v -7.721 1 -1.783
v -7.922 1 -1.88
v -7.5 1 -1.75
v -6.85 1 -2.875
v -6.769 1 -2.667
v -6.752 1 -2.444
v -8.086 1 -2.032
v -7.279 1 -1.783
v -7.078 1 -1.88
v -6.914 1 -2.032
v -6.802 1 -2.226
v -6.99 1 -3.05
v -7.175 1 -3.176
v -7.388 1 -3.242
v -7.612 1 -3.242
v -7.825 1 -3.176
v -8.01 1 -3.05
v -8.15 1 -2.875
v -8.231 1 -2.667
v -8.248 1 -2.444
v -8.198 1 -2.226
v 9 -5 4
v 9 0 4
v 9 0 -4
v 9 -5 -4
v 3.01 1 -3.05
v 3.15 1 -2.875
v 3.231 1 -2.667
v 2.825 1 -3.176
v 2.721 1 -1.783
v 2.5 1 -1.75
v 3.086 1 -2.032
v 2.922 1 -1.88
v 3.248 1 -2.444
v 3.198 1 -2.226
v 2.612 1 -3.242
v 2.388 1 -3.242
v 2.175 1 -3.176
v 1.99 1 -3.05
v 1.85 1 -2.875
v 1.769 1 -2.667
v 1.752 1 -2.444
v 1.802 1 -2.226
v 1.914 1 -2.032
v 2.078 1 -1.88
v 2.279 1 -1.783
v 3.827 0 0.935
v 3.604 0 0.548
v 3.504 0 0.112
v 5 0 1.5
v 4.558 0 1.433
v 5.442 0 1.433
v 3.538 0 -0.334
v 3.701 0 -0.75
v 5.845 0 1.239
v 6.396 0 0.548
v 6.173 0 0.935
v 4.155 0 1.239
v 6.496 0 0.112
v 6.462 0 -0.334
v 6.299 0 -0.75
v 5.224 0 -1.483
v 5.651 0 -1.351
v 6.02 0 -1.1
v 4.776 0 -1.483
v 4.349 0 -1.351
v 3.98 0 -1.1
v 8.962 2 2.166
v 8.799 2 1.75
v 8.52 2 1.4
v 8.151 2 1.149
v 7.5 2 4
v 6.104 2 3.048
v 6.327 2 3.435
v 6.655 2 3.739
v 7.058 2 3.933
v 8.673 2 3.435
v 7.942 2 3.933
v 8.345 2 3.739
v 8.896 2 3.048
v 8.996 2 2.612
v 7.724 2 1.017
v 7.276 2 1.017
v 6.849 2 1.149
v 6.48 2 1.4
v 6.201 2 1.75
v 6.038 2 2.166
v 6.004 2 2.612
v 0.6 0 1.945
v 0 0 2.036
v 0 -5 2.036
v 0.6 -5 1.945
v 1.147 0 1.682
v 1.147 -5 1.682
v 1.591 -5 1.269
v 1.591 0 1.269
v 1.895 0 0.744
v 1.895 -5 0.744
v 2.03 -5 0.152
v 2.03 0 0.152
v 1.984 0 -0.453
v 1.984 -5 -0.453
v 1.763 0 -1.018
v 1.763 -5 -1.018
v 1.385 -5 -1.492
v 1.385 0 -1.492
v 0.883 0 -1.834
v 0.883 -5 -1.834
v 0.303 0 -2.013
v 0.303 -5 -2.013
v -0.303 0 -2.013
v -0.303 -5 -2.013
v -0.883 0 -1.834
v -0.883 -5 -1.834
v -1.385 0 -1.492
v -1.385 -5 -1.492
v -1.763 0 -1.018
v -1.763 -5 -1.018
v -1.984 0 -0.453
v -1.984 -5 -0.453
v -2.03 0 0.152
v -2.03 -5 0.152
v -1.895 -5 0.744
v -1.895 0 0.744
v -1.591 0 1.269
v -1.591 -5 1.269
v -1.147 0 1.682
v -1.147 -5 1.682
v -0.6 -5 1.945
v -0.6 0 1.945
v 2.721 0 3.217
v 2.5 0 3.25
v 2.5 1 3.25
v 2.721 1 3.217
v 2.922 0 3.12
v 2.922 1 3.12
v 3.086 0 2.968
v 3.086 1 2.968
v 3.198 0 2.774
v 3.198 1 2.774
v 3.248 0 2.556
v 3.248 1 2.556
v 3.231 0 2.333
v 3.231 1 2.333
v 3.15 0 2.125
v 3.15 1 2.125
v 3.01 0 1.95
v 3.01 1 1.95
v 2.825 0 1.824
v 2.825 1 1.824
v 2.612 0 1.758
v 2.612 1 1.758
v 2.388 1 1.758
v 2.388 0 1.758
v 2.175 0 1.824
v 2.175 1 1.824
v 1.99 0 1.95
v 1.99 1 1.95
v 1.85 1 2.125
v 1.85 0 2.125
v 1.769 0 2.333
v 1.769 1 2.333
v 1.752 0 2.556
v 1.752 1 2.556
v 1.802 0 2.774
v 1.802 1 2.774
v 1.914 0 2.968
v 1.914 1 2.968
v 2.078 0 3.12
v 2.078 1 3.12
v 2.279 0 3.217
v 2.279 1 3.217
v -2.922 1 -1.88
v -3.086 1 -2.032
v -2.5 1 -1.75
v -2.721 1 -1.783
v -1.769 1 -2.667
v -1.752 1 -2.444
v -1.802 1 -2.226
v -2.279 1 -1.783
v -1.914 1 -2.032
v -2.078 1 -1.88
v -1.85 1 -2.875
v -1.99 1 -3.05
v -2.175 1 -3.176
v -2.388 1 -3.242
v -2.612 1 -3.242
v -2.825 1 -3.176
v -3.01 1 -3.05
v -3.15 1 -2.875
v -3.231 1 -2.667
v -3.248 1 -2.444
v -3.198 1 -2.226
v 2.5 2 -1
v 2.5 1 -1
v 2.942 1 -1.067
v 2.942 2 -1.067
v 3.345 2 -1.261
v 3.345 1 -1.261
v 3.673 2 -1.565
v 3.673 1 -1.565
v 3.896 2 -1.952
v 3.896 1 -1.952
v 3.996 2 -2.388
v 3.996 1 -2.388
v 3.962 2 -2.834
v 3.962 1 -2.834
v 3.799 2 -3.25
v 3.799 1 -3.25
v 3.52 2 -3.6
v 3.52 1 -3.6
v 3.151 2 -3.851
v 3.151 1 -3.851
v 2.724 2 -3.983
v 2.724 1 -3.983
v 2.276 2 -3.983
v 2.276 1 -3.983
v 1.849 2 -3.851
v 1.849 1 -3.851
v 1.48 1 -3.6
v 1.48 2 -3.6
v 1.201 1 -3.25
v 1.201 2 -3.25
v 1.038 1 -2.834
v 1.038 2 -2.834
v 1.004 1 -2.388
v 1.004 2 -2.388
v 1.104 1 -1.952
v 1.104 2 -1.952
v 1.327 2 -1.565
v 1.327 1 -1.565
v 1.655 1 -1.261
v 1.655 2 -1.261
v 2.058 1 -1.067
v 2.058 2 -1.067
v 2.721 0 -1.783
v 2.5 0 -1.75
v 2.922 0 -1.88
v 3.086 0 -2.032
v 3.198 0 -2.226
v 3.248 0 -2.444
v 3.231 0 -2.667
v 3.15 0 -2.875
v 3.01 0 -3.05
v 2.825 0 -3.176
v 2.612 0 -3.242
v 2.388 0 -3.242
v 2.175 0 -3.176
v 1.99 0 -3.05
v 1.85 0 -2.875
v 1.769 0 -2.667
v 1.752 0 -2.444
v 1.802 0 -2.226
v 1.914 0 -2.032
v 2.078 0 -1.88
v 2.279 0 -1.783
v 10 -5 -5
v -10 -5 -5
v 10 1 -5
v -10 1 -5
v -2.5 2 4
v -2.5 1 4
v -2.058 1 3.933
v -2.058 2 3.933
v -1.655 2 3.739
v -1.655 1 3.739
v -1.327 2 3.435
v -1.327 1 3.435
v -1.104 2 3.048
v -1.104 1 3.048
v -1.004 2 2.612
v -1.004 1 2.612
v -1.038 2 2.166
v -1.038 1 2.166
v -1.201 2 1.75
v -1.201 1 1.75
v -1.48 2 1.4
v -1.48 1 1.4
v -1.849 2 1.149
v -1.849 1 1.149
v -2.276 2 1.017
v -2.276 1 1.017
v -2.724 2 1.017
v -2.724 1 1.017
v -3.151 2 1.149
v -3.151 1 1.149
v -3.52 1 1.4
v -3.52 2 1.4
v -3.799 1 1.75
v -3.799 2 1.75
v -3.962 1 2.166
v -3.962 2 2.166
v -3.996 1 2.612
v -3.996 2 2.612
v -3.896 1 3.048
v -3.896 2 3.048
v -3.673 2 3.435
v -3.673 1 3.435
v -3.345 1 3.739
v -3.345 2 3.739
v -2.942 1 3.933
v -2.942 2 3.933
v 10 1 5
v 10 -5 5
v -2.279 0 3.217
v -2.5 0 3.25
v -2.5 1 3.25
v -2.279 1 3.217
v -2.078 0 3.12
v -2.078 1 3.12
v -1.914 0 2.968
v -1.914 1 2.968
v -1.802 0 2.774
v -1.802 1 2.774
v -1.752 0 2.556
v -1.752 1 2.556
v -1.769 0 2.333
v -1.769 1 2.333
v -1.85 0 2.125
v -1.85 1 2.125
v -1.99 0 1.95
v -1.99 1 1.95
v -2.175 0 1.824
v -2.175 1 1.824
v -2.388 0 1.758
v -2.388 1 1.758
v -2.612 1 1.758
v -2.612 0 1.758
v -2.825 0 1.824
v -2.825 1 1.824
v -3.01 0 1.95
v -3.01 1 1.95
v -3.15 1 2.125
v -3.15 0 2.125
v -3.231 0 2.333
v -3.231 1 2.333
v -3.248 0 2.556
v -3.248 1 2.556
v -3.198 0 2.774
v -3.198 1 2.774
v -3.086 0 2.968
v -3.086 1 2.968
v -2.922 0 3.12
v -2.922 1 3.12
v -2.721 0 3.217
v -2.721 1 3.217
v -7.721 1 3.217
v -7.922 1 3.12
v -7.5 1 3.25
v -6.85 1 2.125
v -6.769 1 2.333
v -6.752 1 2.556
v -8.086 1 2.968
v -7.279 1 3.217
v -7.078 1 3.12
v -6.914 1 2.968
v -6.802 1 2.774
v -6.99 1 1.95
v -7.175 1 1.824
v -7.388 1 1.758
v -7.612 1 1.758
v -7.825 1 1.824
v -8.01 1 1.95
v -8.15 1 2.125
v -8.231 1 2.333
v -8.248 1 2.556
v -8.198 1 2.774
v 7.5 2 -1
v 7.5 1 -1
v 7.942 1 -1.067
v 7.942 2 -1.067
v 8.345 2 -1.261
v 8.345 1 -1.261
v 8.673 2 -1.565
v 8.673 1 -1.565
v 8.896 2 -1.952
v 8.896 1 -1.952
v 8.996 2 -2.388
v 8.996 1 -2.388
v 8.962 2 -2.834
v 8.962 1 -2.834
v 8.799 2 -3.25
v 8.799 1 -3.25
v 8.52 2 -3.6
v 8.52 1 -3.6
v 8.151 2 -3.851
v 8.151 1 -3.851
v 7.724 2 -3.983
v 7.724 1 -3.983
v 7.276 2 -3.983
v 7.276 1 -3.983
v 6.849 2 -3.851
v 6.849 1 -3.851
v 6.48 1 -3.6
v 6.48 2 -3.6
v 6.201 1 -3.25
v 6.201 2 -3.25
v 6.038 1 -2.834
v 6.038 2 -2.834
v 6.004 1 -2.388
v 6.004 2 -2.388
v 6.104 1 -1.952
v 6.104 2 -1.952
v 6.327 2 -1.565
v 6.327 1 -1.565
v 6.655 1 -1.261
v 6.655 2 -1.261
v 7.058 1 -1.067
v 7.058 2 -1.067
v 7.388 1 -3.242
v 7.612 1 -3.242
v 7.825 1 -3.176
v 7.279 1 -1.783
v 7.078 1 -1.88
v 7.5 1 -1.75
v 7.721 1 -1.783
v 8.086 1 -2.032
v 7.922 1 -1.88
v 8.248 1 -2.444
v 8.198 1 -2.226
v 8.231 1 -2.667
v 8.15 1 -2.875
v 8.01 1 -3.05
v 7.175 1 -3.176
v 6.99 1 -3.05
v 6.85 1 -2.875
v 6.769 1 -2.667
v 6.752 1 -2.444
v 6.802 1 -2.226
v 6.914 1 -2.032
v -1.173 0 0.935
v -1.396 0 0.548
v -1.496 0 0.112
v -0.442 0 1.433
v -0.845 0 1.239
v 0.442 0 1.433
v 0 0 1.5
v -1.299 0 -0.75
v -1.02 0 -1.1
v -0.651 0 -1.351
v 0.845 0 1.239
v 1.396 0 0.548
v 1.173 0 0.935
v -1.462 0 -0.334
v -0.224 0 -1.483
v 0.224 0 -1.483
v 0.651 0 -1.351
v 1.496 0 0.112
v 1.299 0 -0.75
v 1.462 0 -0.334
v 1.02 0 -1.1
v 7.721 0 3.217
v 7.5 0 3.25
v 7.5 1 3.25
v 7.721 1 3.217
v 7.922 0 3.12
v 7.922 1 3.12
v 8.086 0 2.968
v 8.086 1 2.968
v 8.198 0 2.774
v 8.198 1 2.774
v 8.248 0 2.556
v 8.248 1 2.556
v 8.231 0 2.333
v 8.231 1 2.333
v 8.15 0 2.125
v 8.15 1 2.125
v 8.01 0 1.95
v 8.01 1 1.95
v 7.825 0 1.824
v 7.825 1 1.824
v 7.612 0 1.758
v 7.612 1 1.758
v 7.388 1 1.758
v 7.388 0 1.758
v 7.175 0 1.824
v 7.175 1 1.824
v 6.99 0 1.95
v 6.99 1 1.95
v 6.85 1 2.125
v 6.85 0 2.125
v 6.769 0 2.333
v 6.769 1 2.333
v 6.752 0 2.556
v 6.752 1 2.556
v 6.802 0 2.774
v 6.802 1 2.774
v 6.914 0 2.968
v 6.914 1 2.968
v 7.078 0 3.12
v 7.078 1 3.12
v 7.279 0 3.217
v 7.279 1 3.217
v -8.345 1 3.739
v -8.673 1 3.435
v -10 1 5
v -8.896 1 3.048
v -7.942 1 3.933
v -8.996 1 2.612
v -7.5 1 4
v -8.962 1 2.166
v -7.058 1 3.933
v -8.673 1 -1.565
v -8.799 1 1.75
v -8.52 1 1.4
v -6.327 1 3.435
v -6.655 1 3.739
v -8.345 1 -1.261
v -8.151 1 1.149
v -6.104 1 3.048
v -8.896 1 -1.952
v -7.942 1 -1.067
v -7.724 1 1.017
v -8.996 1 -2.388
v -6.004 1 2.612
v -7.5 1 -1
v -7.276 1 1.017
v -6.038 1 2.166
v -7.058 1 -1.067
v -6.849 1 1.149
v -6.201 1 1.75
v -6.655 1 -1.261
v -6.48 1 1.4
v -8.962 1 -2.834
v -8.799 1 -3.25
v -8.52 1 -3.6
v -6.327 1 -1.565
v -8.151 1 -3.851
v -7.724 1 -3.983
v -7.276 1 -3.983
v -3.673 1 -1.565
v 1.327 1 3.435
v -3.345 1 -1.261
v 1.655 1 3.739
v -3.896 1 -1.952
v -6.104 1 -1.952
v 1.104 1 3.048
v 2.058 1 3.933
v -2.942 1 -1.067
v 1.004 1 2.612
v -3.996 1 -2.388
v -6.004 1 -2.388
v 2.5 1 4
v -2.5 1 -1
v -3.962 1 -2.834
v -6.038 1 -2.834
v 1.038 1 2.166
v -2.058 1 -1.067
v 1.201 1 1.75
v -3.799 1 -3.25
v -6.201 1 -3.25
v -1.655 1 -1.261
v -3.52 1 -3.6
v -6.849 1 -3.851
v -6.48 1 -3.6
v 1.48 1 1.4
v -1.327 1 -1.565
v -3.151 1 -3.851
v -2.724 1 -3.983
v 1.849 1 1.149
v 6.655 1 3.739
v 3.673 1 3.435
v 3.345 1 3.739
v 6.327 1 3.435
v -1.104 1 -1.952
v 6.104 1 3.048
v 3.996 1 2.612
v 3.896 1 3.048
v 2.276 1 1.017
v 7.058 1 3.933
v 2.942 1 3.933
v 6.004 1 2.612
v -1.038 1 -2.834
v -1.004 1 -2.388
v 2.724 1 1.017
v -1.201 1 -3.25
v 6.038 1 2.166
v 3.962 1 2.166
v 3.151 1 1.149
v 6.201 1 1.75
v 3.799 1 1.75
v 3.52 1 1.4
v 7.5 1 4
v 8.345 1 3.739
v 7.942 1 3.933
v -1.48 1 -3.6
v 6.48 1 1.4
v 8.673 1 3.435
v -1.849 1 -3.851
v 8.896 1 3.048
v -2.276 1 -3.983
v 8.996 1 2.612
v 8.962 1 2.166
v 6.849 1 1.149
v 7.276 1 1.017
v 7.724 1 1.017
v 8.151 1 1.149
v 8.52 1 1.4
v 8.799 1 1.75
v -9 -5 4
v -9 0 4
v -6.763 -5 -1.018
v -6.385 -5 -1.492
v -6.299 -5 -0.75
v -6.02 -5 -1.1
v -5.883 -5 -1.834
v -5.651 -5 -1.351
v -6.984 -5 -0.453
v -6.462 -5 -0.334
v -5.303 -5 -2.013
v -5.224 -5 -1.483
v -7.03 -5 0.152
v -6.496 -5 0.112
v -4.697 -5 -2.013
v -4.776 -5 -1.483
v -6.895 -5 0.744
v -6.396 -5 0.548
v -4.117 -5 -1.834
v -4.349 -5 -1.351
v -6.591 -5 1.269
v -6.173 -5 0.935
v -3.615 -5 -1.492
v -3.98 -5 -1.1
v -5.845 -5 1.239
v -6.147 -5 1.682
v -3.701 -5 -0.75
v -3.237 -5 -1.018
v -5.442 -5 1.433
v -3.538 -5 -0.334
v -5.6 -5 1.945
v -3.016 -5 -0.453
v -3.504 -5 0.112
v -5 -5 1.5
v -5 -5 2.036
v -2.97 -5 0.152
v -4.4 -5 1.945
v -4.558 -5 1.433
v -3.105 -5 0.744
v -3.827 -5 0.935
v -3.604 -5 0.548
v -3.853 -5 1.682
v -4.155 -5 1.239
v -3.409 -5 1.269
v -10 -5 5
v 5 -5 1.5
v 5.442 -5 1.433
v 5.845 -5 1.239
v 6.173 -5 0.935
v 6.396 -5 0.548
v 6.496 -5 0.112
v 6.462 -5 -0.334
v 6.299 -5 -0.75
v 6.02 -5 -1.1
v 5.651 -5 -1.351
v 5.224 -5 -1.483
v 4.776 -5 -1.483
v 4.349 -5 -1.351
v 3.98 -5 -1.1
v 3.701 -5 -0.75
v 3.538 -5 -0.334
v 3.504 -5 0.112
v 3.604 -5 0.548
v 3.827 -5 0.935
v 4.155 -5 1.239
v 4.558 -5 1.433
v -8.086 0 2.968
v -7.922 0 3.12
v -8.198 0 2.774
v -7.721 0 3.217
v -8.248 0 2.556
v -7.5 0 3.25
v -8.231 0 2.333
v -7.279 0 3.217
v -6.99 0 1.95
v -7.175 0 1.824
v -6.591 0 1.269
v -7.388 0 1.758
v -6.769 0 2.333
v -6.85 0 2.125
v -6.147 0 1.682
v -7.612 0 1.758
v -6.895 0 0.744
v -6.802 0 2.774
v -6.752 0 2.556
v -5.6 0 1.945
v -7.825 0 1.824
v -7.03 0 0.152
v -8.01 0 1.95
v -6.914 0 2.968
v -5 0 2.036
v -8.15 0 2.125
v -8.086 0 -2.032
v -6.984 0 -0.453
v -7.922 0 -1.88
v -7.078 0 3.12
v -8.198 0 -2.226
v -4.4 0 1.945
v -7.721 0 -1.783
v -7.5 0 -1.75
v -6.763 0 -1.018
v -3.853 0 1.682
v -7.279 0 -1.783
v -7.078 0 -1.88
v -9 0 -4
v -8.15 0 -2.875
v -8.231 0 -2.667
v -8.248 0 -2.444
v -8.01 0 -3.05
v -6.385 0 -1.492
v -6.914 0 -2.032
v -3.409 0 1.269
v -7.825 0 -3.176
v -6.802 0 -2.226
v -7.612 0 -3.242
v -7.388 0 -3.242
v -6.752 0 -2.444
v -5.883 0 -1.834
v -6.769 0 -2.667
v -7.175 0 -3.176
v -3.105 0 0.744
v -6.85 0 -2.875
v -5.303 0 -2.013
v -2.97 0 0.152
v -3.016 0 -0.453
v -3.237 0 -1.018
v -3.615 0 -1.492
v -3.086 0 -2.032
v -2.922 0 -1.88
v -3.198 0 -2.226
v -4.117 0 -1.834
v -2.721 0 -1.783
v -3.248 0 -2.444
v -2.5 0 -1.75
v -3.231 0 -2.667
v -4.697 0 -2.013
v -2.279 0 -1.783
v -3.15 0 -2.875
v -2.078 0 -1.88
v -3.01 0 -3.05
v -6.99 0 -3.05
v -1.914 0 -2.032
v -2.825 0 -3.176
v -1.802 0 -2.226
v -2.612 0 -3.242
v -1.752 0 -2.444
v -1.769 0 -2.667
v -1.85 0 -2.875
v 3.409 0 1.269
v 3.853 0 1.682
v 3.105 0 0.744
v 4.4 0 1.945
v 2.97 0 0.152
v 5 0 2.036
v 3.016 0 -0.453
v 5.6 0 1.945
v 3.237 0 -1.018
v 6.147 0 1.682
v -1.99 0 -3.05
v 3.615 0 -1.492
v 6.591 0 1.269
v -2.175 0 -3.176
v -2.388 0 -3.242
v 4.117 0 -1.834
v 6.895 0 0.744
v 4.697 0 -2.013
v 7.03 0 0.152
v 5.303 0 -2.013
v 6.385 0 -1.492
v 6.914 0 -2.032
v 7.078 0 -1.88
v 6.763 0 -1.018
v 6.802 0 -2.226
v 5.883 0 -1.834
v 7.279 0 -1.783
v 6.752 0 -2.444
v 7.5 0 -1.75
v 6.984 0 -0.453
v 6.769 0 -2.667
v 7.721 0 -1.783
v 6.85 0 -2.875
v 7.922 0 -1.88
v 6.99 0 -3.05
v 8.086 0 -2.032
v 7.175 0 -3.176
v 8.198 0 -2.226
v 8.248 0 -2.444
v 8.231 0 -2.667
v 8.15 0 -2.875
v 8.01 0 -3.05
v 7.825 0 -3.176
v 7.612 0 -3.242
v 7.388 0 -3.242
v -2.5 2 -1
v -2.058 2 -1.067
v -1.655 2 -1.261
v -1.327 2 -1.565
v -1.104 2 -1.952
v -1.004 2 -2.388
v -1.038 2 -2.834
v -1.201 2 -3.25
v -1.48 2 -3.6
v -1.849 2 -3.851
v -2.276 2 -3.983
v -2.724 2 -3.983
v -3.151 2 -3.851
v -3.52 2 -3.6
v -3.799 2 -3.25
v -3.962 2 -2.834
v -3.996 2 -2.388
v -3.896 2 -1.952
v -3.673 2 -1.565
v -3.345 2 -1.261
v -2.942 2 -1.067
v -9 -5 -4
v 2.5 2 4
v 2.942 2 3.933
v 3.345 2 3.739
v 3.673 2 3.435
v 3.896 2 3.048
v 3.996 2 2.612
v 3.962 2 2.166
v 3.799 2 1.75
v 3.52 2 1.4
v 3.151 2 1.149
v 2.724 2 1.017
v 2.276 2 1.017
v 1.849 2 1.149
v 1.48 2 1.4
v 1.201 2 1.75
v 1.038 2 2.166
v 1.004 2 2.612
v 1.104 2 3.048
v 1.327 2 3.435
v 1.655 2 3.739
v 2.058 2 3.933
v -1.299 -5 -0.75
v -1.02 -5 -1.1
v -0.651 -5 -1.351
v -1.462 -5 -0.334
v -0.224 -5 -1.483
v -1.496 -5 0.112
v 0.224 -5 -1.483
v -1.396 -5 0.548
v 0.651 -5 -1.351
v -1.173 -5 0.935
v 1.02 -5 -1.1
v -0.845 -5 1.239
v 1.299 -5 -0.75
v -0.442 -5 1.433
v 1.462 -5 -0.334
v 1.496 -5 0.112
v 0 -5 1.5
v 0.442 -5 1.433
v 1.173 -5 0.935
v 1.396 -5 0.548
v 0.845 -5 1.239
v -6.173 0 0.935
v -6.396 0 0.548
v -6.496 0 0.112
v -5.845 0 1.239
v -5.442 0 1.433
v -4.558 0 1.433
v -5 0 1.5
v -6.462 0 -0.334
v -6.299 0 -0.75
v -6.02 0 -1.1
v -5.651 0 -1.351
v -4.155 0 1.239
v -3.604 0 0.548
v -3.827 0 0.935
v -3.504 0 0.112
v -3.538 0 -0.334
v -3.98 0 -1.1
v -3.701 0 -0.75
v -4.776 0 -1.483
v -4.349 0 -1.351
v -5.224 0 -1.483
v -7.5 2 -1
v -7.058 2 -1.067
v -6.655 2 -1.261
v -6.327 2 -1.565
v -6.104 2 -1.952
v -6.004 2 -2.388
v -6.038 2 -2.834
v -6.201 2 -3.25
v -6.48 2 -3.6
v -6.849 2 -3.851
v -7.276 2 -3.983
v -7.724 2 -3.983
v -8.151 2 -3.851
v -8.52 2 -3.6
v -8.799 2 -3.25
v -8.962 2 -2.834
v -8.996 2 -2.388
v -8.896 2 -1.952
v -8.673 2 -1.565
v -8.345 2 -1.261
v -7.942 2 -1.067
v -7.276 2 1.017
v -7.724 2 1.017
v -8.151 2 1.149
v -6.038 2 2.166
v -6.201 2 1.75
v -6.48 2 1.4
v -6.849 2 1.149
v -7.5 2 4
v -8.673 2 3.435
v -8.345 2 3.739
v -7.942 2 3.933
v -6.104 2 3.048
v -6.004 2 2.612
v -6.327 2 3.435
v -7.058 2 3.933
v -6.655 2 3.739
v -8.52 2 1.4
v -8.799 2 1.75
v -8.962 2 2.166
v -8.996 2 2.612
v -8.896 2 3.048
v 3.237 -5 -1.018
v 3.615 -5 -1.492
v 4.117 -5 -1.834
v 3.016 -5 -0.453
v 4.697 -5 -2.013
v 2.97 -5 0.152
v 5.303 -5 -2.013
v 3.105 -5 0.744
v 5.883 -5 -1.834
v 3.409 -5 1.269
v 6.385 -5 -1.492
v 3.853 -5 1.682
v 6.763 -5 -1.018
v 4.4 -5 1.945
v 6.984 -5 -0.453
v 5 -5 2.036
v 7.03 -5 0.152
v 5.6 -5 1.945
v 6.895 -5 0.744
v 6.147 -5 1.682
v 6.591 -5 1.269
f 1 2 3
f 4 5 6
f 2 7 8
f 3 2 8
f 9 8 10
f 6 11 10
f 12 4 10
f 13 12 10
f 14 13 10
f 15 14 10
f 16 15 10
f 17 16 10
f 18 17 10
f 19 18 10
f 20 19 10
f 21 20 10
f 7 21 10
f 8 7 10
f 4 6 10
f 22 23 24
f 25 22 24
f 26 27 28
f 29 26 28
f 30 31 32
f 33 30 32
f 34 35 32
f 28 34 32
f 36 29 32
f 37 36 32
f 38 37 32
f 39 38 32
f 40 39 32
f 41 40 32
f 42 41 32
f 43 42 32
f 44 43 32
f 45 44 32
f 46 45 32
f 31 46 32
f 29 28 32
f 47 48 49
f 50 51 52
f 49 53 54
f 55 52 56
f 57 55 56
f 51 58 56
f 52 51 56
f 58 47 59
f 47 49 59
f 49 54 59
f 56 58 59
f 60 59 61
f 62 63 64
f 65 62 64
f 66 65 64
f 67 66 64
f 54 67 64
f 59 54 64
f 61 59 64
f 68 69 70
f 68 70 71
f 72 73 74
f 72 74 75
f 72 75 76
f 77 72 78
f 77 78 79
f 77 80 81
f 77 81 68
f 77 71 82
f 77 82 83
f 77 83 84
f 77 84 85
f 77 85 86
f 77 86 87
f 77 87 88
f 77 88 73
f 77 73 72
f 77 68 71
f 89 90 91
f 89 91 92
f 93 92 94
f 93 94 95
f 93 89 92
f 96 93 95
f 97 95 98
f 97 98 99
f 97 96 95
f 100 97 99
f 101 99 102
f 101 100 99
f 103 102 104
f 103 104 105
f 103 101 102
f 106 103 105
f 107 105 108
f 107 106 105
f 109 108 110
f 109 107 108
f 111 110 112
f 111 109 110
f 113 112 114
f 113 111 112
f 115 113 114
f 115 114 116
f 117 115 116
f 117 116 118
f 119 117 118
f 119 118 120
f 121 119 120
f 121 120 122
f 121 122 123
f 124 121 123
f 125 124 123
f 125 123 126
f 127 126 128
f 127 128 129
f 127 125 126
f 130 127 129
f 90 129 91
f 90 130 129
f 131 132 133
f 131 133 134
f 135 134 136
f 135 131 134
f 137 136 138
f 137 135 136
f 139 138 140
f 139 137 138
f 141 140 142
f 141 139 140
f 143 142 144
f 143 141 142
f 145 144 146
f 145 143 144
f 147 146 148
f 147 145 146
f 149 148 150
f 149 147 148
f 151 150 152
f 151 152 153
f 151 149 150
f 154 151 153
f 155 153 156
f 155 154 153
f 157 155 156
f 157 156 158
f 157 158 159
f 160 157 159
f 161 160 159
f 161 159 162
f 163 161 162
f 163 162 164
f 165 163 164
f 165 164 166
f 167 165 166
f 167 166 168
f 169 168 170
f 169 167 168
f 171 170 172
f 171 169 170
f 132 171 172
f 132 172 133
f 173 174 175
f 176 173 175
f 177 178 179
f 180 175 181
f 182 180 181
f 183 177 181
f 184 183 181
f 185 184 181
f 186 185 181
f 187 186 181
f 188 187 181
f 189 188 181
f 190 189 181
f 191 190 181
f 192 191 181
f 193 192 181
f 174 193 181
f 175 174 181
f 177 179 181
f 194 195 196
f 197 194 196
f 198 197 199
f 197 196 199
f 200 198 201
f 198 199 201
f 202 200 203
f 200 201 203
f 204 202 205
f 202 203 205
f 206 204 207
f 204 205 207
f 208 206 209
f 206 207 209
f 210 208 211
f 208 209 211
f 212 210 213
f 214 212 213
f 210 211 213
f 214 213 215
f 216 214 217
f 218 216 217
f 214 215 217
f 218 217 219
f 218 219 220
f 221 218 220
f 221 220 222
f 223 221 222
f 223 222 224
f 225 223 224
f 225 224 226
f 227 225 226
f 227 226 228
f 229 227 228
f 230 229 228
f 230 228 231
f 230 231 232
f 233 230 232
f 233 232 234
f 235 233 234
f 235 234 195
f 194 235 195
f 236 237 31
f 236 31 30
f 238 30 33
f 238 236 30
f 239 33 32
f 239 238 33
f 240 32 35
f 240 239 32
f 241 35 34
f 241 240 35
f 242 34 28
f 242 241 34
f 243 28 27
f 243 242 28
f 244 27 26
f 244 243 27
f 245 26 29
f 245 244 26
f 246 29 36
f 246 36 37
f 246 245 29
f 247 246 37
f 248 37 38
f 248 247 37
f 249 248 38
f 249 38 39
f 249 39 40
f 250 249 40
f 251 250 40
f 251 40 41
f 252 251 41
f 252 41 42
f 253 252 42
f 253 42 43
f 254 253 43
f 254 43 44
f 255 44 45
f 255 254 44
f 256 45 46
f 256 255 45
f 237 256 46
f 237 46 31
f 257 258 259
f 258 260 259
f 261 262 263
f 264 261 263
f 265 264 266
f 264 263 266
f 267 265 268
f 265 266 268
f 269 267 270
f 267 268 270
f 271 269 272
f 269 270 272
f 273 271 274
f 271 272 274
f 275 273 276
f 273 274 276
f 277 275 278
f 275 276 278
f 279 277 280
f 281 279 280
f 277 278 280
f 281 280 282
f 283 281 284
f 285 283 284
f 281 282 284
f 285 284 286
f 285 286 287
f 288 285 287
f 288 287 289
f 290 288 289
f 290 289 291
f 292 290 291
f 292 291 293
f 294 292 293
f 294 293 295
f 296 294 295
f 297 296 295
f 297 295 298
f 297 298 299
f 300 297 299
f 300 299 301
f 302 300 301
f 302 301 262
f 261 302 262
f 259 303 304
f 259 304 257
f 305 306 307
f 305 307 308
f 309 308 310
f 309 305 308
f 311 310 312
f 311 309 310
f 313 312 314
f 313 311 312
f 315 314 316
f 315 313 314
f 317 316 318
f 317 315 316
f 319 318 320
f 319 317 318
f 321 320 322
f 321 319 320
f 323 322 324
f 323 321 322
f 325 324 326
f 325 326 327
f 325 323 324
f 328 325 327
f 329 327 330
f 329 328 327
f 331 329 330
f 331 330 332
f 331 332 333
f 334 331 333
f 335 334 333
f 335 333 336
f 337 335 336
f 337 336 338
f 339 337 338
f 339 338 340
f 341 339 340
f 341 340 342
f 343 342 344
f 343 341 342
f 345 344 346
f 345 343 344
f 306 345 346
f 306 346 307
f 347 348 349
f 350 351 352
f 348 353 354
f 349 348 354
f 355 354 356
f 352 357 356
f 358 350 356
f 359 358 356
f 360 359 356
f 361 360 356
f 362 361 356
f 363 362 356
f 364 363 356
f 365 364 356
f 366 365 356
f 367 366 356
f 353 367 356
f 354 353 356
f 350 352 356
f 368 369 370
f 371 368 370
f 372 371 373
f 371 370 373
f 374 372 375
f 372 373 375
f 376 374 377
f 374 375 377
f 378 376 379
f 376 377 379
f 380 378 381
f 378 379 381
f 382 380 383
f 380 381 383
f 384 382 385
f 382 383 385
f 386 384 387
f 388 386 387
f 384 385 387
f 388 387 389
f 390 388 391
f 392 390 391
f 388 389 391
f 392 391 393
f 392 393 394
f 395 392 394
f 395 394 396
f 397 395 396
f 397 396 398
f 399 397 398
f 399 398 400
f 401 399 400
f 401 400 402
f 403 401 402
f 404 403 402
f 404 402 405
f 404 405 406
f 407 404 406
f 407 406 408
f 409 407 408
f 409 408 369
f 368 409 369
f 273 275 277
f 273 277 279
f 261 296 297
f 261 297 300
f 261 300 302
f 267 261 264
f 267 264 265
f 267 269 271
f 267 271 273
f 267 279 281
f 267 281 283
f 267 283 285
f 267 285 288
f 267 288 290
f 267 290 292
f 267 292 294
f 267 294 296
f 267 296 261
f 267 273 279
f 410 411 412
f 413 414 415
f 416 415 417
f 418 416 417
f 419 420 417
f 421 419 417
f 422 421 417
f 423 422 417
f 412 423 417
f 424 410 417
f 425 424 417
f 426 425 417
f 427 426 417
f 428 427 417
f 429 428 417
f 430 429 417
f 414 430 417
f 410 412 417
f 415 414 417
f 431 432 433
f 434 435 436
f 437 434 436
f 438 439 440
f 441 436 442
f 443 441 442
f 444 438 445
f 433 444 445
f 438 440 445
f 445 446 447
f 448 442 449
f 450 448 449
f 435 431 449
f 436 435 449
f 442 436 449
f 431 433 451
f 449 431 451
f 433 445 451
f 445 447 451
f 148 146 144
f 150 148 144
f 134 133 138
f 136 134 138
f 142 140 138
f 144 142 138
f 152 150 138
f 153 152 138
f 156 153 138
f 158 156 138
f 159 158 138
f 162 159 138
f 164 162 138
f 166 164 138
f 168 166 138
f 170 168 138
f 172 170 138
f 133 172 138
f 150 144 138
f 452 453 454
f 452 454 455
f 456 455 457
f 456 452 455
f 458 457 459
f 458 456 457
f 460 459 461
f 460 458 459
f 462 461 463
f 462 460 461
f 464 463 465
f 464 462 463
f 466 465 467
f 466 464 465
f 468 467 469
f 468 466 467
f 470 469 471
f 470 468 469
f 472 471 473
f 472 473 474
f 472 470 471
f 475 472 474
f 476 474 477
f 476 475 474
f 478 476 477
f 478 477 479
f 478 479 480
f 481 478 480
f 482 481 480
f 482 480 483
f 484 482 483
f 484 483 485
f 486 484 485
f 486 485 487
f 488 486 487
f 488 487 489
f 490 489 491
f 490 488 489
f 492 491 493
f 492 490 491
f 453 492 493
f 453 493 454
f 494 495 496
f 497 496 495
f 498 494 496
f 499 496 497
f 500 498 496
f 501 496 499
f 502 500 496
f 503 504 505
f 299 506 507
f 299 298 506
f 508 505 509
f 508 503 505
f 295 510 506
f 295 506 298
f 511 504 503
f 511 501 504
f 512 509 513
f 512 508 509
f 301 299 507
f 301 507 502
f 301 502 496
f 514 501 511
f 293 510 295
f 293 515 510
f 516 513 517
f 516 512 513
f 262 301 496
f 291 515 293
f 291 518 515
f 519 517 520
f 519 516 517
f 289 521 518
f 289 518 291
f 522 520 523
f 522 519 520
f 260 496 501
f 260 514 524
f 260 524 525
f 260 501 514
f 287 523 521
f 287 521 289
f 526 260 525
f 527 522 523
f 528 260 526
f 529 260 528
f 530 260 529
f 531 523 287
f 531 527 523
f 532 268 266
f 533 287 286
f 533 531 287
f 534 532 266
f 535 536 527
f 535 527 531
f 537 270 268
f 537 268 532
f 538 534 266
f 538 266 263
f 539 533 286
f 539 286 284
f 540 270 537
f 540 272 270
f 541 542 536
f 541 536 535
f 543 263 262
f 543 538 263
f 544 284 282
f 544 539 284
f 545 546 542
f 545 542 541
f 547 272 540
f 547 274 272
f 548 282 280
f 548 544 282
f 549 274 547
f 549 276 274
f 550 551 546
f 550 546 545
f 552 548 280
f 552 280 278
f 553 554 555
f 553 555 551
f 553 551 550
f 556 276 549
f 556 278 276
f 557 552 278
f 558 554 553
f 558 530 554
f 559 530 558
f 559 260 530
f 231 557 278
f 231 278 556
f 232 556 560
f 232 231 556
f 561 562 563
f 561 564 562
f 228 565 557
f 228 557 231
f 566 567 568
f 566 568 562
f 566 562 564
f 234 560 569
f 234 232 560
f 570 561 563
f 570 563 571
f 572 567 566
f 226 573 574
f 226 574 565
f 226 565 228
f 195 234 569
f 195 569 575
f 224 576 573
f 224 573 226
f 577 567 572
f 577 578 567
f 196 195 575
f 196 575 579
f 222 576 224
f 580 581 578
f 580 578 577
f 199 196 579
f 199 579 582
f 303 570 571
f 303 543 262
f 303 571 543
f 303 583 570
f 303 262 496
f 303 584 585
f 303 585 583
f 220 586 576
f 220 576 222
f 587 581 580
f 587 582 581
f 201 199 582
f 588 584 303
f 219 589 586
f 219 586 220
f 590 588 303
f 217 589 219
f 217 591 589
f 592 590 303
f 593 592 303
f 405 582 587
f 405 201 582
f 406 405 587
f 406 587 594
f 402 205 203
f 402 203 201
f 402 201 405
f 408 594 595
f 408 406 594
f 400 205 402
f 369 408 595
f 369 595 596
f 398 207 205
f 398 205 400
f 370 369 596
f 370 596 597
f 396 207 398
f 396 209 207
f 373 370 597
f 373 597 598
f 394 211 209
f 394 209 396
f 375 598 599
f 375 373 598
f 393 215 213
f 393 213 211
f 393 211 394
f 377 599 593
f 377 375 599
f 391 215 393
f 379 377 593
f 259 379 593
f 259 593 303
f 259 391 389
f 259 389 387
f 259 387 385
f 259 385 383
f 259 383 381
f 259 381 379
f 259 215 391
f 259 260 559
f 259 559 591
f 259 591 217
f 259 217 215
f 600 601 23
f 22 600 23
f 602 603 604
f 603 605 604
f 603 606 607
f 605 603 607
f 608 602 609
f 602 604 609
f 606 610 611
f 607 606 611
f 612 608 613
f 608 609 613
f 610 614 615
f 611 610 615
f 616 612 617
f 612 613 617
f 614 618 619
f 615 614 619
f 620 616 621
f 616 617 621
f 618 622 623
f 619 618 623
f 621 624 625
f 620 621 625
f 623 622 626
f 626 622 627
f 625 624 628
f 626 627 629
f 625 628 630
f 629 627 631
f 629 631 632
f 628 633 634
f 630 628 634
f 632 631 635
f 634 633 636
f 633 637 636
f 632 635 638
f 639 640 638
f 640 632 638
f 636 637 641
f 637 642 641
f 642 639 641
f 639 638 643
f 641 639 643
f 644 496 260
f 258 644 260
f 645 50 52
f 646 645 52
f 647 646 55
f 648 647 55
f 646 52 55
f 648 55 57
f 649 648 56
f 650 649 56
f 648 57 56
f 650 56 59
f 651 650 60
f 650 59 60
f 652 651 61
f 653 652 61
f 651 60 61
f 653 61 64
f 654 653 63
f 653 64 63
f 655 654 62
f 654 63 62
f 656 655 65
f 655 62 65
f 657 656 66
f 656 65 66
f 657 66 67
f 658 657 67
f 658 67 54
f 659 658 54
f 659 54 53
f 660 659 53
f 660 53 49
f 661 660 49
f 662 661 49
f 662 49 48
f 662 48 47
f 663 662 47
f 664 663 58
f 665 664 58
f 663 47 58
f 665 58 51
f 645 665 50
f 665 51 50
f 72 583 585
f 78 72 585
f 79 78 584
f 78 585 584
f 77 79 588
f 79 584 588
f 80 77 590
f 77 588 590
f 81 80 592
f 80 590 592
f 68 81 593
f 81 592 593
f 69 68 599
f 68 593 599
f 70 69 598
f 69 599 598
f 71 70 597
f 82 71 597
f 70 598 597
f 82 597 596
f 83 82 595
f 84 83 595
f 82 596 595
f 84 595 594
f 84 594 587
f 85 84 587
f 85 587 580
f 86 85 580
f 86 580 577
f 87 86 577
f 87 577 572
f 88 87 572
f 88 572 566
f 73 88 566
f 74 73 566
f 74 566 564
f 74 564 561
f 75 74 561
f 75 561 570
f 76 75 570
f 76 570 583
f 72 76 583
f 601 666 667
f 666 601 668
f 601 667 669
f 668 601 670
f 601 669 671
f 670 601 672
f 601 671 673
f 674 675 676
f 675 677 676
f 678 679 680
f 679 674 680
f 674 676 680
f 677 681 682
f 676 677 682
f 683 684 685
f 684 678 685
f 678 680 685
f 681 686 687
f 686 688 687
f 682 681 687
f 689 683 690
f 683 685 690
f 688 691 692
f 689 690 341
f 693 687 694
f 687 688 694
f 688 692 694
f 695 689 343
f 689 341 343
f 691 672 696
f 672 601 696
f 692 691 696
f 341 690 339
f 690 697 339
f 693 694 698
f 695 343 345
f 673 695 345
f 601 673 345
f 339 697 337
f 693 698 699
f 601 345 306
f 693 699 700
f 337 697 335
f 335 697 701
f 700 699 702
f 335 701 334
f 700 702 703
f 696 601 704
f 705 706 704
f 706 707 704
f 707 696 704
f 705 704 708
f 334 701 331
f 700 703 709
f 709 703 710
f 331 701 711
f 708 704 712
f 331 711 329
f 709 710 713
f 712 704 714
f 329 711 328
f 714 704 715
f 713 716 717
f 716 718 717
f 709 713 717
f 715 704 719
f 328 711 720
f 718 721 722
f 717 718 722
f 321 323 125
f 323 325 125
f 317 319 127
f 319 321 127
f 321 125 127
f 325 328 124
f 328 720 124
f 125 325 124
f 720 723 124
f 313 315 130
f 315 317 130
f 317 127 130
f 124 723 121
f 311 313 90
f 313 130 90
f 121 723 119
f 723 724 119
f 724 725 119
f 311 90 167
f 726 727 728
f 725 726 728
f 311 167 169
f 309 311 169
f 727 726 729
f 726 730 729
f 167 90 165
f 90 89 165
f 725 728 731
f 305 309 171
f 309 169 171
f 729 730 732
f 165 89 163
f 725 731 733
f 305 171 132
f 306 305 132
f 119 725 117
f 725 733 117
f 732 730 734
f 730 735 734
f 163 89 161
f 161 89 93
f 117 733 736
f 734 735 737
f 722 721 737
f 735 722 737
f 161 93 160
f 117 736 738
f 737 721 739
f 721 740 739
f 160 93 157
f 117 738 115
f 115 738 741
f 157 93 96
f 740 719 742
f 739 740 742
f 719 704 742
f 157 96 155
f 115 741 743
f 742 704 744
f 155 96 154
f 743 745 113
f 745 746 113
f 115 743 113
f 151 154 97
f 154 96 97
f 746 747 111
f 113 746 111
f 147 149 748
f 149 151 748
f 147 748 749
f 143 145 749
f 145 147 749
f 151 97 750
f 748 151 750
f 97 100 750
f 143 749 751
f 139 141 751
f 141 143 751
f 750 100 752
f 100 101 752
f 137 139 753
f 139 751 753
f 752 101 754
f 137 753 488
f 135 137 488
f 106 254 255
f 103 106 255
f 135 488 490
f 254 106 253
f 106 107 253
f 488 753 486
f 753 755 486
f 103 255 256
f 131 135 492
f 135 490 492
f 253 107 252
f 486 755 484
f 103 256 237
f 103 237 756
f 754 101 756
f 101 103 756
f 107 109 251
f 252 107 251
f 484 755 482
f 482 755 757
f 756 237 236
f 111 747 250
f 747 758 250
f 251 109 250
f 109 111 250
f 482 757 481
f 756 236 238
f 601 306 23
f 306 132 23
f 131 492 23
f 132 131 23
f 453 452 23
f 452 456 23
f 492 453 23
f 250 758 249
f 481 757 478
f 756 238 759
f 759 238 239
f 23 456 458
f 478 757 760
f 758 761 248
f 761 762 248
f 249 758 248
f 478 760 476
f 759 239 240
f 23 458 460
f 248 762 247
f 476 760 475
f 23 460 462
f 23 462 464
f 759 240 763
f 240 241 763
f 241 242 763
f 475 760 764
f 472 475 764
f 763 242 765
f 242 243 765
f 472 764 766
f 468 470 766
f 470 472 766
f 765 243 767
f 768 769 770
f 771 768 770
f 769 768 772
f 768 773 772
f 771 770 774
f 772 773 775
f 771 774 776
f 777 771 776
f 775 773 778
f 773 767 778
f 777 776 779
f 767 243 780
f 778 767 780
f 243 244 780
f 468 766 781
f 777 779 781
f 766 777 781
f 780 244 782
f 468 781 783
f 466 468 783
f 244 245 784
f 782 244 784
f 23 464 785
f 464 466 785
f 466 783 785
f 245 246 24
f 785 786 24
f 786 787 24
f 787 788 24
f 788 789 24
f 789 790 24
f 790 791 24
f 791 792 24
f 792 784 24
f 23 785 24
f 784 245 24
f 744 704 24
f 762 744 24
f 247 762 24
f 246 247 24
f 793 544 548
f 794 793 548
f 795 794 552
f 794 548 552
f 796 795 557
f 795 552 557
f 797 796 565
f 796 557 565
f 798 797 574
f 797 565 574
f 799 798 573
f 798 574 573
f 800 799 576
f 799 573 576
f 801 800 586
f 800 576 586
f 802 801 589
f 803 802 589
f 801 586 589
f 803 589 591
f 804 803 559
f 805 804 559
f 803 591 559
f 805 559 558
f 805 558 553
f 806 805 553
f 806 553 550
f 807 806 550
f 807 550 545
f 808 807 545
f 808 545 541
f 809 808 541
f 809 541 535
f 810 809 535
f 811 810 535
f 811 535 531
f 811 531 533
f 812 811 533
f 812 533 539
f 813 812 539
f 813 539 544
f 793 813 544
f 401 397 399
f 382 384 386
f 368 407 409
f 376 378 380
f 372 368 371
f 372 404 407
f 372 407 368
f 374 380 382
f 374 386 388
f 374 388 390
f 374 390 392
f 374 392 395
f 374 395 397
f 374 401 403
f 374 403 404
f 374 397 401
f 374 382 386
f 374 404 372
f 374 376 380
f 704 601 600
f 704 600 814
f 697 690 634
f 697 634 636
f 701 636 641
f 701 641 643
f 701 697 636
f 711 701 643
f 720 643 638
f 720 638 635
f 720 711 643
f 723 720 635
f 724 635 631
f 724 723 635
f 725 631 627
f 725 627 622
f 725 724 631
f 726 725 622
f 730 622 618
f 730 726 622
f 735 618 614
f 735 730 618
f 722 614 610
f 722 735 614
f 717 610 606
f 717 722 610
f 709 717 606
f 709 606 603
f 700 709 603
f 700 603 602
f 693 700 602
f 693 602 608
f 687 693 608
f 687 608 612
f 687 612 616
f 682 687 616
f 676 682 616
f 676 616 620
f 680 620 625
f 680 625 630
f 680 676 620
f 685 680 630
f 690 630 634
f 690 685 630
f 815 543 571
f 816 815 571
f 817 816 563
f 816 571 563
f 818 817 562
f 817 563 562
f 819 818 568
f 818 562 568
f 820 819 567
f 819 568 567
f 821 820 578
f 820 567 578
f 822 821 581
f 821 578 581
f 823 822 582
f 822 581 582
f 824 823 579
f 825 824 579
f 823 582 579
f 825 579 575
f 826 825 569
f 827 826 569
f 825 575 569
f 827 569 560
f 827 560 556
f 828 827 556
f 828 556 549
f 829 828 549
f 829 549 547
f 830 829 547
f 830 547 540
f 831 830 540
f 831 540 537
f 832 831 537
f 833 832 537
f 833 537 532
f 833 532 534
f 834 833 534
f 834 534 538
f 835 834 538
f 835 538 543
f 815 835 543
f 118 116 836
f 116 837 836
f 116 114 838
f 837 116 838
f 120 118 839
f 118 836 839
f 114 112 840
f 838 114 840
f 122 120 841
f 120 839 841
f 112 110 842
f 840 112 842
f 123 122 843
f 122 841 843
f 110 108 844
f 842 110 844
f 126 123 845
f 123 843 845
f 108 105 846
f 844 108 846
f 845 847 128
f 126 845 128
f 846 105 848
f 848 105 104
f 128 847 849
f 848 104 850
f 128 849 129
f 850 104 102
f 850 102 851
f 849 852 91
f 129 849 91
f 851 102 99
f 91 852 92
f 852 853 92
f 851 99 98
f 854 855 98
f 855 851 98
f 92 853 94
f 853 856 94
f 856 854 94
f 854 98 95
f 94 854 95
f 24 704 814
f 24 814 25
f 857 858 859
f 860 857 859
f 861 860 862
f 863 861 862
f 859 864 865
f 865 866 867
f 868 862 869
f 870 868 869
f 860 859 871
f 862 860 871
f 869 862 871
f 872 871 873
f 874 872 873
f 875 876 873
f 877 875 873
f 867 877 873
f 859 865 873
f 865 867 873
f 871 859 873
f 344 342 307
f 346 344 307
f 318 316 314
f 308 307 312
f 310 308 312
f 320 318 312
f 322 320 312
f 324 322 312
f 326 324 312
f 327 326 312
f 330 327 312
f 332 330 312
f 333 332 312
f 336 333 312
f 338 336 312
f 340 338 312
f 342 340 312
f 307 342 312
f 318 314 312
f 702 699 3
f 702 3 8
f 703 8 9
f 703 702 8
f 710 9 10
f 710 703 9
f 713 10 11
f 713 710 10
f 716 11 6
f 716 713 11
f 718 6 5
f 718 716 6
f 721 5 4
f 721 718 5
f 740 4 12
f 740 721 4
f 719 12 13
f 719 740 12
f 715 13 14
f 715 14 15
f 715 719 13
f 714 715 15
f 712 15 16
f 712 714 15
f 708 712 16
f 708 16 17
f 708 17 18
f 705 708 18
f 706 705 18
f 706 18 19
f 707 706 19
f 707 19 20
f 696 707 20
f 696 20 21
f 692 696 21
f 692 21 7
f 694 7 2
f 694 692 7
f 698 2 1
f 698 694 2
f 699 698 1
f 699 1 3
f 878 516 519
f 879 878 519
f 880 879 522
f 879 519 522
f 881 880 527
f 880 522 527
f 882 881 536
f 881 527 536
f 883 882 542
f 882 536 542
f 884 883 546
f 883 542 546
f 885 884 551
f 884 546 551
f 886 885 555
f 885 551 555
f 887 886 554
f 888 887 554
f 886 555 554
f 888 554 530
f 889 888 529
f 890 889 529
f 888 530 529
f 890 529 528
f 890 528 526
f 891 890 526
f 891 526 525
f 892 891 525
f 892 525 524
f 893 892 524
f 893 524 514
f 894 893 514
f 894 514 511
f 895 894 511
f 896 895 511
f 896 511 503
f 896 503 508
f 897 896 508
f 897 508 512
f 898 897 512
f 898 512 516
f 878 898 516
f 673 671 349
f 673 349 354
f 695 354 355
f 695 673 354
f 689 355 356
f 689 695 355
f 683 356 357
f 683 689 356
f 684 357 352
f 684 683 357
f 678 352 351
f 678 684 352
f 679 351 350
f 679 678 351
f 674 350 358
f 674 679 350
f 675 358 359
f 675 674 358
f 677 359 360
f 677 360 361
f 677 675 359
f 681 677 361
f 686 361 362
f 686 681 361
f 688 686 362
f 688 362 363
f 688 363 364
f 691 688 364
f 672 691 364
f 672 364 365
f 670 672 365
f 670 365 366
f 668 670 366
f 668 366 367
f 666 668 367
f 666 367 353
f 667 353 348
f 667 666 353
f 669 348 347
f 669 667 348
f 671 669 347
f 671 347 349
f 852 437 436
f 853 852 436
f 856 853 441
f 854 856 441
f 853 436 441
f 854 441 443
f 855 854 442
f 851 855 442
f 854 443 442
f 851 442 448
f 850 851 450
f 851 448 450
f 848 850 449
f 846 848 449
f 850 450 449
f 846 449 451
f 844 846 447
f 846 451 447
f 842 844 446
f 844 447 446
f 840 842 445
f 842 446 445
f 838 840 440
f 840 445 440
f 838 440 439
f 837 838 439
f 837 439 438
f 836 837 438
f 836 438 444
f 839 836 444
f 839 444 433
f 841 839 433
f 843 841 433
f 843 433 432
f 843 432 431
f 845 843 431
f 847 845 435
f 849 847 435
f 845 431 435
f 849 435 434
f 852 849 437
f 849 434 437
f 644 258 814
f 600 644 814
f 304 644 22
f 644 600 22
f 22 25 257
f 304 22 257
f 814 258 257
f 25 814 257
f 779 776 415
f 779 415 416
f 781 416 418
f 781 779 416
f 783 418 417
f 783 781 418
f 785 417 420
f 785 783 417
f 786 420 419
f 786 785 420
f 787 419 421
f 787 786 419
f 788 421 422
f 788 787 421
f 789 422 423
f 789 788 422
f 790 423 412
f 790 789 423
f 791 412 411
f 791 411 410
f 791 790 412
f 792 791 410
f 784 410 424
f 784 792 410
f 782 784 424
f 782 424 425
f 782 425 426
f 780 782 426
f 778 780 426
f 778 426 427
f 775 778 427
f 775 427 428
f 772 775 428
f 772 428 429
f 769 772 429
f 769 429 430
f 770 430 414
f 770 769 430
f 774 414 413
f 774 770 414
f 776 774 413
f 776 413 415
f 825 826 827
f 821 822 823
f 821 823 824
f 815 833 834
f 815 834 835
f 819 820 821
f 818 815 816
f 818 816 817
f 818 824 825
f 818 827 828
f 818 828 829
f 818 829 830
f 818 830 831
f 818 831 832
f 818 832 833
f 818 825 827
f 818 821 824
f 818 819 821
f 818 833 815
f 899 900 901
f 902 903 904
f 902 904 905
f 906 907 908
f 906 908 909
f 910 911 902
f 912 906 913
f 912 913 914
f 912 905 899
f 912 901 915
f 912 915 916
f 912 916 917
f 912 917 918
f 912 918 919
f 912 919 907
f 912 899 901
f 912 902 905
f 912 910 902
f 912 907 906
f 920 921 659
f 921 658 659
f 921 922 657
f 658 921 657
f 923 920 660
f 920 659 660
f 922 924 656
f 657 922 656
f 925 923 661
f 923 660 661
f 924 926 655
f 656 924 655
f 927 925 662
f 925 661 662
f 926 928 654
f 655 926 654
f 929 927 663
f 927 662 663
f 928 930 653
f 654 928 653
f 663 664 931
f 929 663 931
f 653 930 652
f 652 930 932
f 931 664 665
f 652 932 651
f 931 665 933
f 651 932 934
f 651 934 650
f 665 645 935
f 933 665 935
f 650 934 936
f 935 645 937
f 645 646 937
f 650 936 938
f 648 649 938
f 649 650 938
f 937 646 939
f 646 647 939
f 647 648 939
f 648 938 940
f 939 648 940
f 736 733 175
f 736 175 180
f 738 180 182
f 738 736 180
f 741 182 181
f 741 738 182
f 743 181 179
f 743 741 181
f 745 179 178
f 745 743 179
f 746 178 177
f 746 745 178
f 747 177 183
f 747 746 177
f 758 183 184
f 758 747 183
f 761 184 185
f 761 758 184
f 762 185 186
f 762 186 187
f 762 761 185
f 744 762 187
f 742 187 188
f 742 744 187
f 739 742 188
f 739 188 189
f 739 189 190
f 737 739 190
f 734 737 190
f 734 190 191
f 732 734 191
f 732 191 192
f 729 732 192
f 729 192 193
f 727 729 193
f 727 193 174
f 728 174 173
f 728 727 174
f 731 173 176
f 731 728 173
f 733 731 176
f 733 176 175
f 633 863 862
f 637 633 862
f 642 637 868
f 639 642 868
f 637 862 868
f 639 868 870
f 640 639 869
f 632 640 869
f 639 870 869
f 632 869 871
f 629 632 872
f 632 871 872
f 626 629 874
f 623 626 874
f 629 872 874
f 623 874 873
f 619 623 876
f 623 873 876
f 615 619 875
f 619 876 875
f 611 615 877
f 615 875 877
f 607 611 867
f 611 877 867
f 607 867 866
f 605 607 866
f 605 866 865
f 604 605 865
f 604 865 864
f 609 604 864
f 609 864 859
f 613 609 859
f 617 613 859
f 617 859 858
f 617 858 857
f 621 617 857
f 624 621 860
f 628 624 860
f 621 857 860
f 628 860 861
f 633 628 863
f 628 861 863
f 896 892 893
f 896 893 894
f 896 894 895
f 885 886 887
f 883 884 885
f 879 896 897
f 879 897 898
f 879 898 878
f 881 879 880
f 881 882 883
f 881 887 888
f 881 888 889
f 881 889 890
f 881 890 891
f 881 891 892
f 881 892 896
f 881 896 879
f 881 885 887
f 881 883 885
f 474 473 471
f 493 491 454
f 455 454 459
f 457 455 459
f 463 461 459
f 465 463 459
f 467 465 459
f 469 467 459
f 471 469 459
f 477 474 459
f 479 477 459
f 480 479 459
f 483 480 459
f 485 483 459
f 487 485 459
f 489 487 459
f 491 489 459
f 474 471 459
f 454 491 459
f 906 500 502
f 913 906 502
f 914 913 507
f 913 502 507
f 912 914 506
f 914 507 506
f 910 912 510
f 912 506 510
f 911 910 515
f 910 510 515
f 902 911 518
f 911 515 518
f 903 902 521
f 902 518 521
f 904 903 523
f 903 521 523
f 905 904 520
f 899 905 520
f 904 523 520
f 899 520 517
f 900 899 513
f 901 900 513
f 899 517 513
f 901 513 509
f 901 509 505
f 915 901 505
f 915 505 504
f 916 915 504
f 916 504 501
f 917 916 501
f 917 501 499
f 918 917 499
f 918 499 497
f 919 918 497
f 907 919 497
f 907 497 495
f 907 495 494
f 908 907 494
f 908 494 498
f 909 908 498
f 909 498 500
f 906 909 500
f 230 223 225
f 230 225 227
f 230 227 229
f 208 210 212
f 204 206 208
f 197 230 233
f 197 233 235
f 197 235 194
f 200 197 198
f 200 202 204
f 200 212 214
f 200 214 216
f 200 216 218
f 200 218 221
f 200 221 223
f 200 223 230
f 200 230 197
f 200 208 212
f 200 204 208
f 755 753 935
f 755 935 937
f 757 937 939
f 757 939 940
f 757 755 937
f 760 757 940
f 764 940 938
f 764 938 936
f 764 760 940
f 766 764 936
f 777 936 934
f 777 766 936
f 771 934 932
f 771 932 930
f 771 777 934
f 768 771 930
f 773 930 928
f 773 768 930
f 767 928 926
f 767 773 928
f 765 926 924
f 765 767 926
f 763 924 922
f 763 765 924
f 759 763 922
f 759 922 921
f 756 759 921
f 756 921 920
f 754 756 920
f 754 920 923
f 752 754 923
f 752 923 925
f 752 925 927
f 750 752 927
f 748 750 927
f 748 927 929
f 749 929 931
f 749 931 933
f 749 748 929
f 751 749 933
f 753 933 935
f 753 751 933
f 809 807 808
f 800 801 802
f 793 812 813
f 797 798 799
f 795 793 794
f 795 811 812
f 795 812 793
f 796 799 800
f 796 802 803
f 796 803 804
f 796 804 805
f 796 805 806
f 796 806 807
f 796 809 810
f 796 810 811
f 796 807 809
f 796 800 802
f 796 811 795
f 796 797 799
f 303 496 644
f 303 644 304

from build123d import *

# Parameters (mm, degrees)
SKETCH1_R             = 1.5
BOSS_EXTRUDE1_DEPTH   = 2
BOSS_EXTRUDE1_2_DEPTH = 2
BOSS_EXTRUDE1_3_DEPTH = 2
BOSS_EXTRUDE1_4_DEPTH = 2
BOSS_EXTRUDE1_5_DEPTH = 2
BOSS_EXTRUDE1_6_DEPTH = 2
BOSS_EXTRUDE1_7_DEPTH = 2
BOSS_EXTRUDE1_8_DEPTH = 2
SKETCH1_3_W           = 20
SKETCH1_3_H           = 10
BOSS_EXTRUDE2_DEPTH   = 1
SKETCH1_4_R           = 0.75
CUT_EXTRUDE1_DEPTH    = 1
SKETCH1_5_W           = 20
SKETCH1_5_H           = 10
SKETCH1_5_W_2         = 18
SKETCH1_5_H_2         = 8
SKETCH1_5_R           = 2.035533906
SKETCH1_5_R_2         = 1.5
BOSS_EXTRUDE3_DEPTH   = 5


with BuildPart() as part:
    # Sketch1 → Boss-Extrude1 (new body)
    with BuildSketch(Plane(origin=(0, 0, 0), x_dir=(1, 0, 0), z_dir=(0, 1, 0))):
        with Locations((-7.5, -2.5)):
            Circle(SKETCH1_R)
    extrude(amount=BOSS_EXTRUDE1_DEPTH)



with BuildPart() as body_2:
    # Sketch1 → Boss-Extrude1 2 (new body)
    with BuildSketch(Plane(origin=(0, 0, 0), x_dir=(1, 0, 0), z_dir=(0, 1, 0))):
        with Locations((-2.5, -2.5)):
            Circle(SKETCH1_R)
    extrude(amount=BOSS_EXTRUDE1_2_DEPTH)


with BuildPart() as body_3:
    # Sketch1 → Boss-Extrude1 3 (new body)
    with BuildSketch(Plane(origin=(0, 0, 0), x_dir=(1, 0, 0), z_dir=(0, 1, 0))):
        with Locations((-7.5, 2.5)):
            Circle(SKETCH1_R)
    extrude(amount=BOSS_EXTRUDE1_3_DEPTH)


with BuildPart() as body_4:
    # Sketch1 → Boss-Extrude1 4 (new body)
    with BuildSketch(Plane(origin=(0, 0, 0), x_dir=(1, 0, 0), z_dir=(0, 1, 0))):
        with Locations((2.5, -2.5)):
            Circle(SKETCH1_R)
    extrude(amount=BOSS_EXTRUDE1_4_DEPTH)


with BuildPart() as body_5:
    # Sketch1 → Boss-Extrude1 5 (new body)
    with BuildSketch(Plane(origin=(0, 0, 0), x_dir=(1, 0, 0), z_dir=(0, 1, 0))):
        with Locations((7.5, -2.5)):
            Circle(SKETCH1_R)
    extrude(amount=BOSS_EXTRUDE1_5_DEPTH)


with BuildPart() as body_6:
    # Sketch1 → Boss-Extrude1 6 (new body)
    with BuildSketch(Plane(origin=(0, 0, 0), x_dir=(1, 0, 0), z_dir=(0, 1, 0))):
        with Locations((-2.5, 2.5)):
            Circle(SKETCH1_R)
    extrude(amount=BOSS_EXTRUDE1_6_DEPTH)


with BuildPart() as body_7:
    # Sketch1 → Boss-Extrude1 7 (new body)
    with BuildSketch(Plane(origin=(0, 0, 0), x_dir=(1, 0, 0), z_dir=(0, 1, 0))):
        with Locations((2.5, 2.5)):
            Circle(SKETCH1_R)
    extrude(amount=BOSS_EXTRUDE1_7_DEPTH)


with BuildPart() as body_8:
    # Sketch1 → Boss-Extrude1 8 (new body)
    with BuildSketch(Plane(origin=(0, 0, 0), x_dir=(1, 0, 0), z_dir=(0, 1, 0))):
        with Locations((7.5, 2.5)):
            Circle(SKETCH1_R)
    extrude(amount=BOSS_EXTRUDE1_8_DEPTH)


with BuildPart() as part_1:
    add(part.part)

    add(body_2.part)  # Boss-Extrude2 merges body 2

    add(body_3.part)  # Boss-Extrude2 merges body 3

    add(body_4.part)  # Boss-Extrude2 merges body 4

    add(body_5.part)  # Boss-Extrude2 merges body 5

    add(body_6.part)  # Boss-Extrude2 merges body 6

    add(body_7.part)  # Boss-Extrude2 merges body 7

    add(body_8.part)  # Boss-Extrude2 merges body 8
    # Sketch1<3> → Boss-Extrude2 (add)
    with BuildSketch(Plane(origin=(0, 0, 0), x_dir=(1, 0, 0), z_dir=(0, 1, 0))):
        Rectangle(SKETCH1_3_W, SKETCH1_3_H)
    extrude(amount=BOSS_EXTRUDE2_DEPTH)

    # Sketch1<4> → Cut-Extrude1 (cut)
    with BuildSketch(Plane(origin=(0, 0, 0), x_dir=(1, 0, 0), z_dir=(0, 1, 0))):
        with Locations((-7.5, 2.5)):
            Circle(SKETCH1_4_R)
        with Locations((-2.5, 2.5)):
            Circle(SKETCH1_4_R)
        with Locations((2.5, 2.5)):
            Circle(SKETCH1_4_R)
        with Locations((7.5, 2.5)):
            Circle(SKETCH1_4_R)
        with Locations((-2.5, -2.5)):
            Circle(SKETCH1_4_R)
        with Locations((2.5, -2.5)):
            Circle(SKETCH1_4_R)
        with Locations((7.5, -2.5)):
            Circle(SKETCH1_4_R)
        with Locations((-7.5, -2.5)):
            Circle(SKETCH1_4_R)
    extrude(amount=CUT_EXTRUDE1_DEPTH, mode=Mode.SUBTRACT)

    # Sketch1<5> → Boss-Extrude3 (add)
    # profile 1 of 4: a face of its own
    with BuildSketch(Plane(origin=(0, 0, 0), x_dir=(1, 0, 0), z_dir=(0, 1, 0))):
        Rectangle(SKETCH1_5_W, SKETCH1_5_H)
        Rectangle(SKETCH1_5_W_2, SKETCH1_5_H_2, mode=Mode.SUBTRACT)
    # profile 2 of 4: a face of its own
    with BuildSketch(Plane(origin=(0, 0, 0), x_dir=(1, 0, 0), z_dir=(0, 1, 0))):
        with Locations((-5, 0)):
            Circle(SKETCH1_5_R)
        with Locations((-5, 0)):
            Circle(SKETCH1_5_R_2, mode=Mode.SUBTRACT)
    # profile 3 of 4: a face of its own
    with BuildSketch(Plane(origin=(0, 0, 0), x_dir=(1, 0, 0), z_dir=(0, 1, 0))):
        Circle(SKETCH1_5_R)
        Circle(SKETCH1_5_R_2, mode=Mode.SUBTRACT)
    # profile 4 of 4: a face of its own
    with BuildSketch(Plane(origin=(0, 0, 0), x_dir=(1, 0, 0), z_dir=(0, 1, 0))):
        with Locations((5, 0)):
            Circle(SKETCH1_5_R)
        with Locations((5, 0)):
            Circle(SKETCH1_5_R_2, mode=Mode.SUBTRACT)
    extrude(amount=-BOSS_EXTRUDE3_DEPTH)


solid = part_1.part
